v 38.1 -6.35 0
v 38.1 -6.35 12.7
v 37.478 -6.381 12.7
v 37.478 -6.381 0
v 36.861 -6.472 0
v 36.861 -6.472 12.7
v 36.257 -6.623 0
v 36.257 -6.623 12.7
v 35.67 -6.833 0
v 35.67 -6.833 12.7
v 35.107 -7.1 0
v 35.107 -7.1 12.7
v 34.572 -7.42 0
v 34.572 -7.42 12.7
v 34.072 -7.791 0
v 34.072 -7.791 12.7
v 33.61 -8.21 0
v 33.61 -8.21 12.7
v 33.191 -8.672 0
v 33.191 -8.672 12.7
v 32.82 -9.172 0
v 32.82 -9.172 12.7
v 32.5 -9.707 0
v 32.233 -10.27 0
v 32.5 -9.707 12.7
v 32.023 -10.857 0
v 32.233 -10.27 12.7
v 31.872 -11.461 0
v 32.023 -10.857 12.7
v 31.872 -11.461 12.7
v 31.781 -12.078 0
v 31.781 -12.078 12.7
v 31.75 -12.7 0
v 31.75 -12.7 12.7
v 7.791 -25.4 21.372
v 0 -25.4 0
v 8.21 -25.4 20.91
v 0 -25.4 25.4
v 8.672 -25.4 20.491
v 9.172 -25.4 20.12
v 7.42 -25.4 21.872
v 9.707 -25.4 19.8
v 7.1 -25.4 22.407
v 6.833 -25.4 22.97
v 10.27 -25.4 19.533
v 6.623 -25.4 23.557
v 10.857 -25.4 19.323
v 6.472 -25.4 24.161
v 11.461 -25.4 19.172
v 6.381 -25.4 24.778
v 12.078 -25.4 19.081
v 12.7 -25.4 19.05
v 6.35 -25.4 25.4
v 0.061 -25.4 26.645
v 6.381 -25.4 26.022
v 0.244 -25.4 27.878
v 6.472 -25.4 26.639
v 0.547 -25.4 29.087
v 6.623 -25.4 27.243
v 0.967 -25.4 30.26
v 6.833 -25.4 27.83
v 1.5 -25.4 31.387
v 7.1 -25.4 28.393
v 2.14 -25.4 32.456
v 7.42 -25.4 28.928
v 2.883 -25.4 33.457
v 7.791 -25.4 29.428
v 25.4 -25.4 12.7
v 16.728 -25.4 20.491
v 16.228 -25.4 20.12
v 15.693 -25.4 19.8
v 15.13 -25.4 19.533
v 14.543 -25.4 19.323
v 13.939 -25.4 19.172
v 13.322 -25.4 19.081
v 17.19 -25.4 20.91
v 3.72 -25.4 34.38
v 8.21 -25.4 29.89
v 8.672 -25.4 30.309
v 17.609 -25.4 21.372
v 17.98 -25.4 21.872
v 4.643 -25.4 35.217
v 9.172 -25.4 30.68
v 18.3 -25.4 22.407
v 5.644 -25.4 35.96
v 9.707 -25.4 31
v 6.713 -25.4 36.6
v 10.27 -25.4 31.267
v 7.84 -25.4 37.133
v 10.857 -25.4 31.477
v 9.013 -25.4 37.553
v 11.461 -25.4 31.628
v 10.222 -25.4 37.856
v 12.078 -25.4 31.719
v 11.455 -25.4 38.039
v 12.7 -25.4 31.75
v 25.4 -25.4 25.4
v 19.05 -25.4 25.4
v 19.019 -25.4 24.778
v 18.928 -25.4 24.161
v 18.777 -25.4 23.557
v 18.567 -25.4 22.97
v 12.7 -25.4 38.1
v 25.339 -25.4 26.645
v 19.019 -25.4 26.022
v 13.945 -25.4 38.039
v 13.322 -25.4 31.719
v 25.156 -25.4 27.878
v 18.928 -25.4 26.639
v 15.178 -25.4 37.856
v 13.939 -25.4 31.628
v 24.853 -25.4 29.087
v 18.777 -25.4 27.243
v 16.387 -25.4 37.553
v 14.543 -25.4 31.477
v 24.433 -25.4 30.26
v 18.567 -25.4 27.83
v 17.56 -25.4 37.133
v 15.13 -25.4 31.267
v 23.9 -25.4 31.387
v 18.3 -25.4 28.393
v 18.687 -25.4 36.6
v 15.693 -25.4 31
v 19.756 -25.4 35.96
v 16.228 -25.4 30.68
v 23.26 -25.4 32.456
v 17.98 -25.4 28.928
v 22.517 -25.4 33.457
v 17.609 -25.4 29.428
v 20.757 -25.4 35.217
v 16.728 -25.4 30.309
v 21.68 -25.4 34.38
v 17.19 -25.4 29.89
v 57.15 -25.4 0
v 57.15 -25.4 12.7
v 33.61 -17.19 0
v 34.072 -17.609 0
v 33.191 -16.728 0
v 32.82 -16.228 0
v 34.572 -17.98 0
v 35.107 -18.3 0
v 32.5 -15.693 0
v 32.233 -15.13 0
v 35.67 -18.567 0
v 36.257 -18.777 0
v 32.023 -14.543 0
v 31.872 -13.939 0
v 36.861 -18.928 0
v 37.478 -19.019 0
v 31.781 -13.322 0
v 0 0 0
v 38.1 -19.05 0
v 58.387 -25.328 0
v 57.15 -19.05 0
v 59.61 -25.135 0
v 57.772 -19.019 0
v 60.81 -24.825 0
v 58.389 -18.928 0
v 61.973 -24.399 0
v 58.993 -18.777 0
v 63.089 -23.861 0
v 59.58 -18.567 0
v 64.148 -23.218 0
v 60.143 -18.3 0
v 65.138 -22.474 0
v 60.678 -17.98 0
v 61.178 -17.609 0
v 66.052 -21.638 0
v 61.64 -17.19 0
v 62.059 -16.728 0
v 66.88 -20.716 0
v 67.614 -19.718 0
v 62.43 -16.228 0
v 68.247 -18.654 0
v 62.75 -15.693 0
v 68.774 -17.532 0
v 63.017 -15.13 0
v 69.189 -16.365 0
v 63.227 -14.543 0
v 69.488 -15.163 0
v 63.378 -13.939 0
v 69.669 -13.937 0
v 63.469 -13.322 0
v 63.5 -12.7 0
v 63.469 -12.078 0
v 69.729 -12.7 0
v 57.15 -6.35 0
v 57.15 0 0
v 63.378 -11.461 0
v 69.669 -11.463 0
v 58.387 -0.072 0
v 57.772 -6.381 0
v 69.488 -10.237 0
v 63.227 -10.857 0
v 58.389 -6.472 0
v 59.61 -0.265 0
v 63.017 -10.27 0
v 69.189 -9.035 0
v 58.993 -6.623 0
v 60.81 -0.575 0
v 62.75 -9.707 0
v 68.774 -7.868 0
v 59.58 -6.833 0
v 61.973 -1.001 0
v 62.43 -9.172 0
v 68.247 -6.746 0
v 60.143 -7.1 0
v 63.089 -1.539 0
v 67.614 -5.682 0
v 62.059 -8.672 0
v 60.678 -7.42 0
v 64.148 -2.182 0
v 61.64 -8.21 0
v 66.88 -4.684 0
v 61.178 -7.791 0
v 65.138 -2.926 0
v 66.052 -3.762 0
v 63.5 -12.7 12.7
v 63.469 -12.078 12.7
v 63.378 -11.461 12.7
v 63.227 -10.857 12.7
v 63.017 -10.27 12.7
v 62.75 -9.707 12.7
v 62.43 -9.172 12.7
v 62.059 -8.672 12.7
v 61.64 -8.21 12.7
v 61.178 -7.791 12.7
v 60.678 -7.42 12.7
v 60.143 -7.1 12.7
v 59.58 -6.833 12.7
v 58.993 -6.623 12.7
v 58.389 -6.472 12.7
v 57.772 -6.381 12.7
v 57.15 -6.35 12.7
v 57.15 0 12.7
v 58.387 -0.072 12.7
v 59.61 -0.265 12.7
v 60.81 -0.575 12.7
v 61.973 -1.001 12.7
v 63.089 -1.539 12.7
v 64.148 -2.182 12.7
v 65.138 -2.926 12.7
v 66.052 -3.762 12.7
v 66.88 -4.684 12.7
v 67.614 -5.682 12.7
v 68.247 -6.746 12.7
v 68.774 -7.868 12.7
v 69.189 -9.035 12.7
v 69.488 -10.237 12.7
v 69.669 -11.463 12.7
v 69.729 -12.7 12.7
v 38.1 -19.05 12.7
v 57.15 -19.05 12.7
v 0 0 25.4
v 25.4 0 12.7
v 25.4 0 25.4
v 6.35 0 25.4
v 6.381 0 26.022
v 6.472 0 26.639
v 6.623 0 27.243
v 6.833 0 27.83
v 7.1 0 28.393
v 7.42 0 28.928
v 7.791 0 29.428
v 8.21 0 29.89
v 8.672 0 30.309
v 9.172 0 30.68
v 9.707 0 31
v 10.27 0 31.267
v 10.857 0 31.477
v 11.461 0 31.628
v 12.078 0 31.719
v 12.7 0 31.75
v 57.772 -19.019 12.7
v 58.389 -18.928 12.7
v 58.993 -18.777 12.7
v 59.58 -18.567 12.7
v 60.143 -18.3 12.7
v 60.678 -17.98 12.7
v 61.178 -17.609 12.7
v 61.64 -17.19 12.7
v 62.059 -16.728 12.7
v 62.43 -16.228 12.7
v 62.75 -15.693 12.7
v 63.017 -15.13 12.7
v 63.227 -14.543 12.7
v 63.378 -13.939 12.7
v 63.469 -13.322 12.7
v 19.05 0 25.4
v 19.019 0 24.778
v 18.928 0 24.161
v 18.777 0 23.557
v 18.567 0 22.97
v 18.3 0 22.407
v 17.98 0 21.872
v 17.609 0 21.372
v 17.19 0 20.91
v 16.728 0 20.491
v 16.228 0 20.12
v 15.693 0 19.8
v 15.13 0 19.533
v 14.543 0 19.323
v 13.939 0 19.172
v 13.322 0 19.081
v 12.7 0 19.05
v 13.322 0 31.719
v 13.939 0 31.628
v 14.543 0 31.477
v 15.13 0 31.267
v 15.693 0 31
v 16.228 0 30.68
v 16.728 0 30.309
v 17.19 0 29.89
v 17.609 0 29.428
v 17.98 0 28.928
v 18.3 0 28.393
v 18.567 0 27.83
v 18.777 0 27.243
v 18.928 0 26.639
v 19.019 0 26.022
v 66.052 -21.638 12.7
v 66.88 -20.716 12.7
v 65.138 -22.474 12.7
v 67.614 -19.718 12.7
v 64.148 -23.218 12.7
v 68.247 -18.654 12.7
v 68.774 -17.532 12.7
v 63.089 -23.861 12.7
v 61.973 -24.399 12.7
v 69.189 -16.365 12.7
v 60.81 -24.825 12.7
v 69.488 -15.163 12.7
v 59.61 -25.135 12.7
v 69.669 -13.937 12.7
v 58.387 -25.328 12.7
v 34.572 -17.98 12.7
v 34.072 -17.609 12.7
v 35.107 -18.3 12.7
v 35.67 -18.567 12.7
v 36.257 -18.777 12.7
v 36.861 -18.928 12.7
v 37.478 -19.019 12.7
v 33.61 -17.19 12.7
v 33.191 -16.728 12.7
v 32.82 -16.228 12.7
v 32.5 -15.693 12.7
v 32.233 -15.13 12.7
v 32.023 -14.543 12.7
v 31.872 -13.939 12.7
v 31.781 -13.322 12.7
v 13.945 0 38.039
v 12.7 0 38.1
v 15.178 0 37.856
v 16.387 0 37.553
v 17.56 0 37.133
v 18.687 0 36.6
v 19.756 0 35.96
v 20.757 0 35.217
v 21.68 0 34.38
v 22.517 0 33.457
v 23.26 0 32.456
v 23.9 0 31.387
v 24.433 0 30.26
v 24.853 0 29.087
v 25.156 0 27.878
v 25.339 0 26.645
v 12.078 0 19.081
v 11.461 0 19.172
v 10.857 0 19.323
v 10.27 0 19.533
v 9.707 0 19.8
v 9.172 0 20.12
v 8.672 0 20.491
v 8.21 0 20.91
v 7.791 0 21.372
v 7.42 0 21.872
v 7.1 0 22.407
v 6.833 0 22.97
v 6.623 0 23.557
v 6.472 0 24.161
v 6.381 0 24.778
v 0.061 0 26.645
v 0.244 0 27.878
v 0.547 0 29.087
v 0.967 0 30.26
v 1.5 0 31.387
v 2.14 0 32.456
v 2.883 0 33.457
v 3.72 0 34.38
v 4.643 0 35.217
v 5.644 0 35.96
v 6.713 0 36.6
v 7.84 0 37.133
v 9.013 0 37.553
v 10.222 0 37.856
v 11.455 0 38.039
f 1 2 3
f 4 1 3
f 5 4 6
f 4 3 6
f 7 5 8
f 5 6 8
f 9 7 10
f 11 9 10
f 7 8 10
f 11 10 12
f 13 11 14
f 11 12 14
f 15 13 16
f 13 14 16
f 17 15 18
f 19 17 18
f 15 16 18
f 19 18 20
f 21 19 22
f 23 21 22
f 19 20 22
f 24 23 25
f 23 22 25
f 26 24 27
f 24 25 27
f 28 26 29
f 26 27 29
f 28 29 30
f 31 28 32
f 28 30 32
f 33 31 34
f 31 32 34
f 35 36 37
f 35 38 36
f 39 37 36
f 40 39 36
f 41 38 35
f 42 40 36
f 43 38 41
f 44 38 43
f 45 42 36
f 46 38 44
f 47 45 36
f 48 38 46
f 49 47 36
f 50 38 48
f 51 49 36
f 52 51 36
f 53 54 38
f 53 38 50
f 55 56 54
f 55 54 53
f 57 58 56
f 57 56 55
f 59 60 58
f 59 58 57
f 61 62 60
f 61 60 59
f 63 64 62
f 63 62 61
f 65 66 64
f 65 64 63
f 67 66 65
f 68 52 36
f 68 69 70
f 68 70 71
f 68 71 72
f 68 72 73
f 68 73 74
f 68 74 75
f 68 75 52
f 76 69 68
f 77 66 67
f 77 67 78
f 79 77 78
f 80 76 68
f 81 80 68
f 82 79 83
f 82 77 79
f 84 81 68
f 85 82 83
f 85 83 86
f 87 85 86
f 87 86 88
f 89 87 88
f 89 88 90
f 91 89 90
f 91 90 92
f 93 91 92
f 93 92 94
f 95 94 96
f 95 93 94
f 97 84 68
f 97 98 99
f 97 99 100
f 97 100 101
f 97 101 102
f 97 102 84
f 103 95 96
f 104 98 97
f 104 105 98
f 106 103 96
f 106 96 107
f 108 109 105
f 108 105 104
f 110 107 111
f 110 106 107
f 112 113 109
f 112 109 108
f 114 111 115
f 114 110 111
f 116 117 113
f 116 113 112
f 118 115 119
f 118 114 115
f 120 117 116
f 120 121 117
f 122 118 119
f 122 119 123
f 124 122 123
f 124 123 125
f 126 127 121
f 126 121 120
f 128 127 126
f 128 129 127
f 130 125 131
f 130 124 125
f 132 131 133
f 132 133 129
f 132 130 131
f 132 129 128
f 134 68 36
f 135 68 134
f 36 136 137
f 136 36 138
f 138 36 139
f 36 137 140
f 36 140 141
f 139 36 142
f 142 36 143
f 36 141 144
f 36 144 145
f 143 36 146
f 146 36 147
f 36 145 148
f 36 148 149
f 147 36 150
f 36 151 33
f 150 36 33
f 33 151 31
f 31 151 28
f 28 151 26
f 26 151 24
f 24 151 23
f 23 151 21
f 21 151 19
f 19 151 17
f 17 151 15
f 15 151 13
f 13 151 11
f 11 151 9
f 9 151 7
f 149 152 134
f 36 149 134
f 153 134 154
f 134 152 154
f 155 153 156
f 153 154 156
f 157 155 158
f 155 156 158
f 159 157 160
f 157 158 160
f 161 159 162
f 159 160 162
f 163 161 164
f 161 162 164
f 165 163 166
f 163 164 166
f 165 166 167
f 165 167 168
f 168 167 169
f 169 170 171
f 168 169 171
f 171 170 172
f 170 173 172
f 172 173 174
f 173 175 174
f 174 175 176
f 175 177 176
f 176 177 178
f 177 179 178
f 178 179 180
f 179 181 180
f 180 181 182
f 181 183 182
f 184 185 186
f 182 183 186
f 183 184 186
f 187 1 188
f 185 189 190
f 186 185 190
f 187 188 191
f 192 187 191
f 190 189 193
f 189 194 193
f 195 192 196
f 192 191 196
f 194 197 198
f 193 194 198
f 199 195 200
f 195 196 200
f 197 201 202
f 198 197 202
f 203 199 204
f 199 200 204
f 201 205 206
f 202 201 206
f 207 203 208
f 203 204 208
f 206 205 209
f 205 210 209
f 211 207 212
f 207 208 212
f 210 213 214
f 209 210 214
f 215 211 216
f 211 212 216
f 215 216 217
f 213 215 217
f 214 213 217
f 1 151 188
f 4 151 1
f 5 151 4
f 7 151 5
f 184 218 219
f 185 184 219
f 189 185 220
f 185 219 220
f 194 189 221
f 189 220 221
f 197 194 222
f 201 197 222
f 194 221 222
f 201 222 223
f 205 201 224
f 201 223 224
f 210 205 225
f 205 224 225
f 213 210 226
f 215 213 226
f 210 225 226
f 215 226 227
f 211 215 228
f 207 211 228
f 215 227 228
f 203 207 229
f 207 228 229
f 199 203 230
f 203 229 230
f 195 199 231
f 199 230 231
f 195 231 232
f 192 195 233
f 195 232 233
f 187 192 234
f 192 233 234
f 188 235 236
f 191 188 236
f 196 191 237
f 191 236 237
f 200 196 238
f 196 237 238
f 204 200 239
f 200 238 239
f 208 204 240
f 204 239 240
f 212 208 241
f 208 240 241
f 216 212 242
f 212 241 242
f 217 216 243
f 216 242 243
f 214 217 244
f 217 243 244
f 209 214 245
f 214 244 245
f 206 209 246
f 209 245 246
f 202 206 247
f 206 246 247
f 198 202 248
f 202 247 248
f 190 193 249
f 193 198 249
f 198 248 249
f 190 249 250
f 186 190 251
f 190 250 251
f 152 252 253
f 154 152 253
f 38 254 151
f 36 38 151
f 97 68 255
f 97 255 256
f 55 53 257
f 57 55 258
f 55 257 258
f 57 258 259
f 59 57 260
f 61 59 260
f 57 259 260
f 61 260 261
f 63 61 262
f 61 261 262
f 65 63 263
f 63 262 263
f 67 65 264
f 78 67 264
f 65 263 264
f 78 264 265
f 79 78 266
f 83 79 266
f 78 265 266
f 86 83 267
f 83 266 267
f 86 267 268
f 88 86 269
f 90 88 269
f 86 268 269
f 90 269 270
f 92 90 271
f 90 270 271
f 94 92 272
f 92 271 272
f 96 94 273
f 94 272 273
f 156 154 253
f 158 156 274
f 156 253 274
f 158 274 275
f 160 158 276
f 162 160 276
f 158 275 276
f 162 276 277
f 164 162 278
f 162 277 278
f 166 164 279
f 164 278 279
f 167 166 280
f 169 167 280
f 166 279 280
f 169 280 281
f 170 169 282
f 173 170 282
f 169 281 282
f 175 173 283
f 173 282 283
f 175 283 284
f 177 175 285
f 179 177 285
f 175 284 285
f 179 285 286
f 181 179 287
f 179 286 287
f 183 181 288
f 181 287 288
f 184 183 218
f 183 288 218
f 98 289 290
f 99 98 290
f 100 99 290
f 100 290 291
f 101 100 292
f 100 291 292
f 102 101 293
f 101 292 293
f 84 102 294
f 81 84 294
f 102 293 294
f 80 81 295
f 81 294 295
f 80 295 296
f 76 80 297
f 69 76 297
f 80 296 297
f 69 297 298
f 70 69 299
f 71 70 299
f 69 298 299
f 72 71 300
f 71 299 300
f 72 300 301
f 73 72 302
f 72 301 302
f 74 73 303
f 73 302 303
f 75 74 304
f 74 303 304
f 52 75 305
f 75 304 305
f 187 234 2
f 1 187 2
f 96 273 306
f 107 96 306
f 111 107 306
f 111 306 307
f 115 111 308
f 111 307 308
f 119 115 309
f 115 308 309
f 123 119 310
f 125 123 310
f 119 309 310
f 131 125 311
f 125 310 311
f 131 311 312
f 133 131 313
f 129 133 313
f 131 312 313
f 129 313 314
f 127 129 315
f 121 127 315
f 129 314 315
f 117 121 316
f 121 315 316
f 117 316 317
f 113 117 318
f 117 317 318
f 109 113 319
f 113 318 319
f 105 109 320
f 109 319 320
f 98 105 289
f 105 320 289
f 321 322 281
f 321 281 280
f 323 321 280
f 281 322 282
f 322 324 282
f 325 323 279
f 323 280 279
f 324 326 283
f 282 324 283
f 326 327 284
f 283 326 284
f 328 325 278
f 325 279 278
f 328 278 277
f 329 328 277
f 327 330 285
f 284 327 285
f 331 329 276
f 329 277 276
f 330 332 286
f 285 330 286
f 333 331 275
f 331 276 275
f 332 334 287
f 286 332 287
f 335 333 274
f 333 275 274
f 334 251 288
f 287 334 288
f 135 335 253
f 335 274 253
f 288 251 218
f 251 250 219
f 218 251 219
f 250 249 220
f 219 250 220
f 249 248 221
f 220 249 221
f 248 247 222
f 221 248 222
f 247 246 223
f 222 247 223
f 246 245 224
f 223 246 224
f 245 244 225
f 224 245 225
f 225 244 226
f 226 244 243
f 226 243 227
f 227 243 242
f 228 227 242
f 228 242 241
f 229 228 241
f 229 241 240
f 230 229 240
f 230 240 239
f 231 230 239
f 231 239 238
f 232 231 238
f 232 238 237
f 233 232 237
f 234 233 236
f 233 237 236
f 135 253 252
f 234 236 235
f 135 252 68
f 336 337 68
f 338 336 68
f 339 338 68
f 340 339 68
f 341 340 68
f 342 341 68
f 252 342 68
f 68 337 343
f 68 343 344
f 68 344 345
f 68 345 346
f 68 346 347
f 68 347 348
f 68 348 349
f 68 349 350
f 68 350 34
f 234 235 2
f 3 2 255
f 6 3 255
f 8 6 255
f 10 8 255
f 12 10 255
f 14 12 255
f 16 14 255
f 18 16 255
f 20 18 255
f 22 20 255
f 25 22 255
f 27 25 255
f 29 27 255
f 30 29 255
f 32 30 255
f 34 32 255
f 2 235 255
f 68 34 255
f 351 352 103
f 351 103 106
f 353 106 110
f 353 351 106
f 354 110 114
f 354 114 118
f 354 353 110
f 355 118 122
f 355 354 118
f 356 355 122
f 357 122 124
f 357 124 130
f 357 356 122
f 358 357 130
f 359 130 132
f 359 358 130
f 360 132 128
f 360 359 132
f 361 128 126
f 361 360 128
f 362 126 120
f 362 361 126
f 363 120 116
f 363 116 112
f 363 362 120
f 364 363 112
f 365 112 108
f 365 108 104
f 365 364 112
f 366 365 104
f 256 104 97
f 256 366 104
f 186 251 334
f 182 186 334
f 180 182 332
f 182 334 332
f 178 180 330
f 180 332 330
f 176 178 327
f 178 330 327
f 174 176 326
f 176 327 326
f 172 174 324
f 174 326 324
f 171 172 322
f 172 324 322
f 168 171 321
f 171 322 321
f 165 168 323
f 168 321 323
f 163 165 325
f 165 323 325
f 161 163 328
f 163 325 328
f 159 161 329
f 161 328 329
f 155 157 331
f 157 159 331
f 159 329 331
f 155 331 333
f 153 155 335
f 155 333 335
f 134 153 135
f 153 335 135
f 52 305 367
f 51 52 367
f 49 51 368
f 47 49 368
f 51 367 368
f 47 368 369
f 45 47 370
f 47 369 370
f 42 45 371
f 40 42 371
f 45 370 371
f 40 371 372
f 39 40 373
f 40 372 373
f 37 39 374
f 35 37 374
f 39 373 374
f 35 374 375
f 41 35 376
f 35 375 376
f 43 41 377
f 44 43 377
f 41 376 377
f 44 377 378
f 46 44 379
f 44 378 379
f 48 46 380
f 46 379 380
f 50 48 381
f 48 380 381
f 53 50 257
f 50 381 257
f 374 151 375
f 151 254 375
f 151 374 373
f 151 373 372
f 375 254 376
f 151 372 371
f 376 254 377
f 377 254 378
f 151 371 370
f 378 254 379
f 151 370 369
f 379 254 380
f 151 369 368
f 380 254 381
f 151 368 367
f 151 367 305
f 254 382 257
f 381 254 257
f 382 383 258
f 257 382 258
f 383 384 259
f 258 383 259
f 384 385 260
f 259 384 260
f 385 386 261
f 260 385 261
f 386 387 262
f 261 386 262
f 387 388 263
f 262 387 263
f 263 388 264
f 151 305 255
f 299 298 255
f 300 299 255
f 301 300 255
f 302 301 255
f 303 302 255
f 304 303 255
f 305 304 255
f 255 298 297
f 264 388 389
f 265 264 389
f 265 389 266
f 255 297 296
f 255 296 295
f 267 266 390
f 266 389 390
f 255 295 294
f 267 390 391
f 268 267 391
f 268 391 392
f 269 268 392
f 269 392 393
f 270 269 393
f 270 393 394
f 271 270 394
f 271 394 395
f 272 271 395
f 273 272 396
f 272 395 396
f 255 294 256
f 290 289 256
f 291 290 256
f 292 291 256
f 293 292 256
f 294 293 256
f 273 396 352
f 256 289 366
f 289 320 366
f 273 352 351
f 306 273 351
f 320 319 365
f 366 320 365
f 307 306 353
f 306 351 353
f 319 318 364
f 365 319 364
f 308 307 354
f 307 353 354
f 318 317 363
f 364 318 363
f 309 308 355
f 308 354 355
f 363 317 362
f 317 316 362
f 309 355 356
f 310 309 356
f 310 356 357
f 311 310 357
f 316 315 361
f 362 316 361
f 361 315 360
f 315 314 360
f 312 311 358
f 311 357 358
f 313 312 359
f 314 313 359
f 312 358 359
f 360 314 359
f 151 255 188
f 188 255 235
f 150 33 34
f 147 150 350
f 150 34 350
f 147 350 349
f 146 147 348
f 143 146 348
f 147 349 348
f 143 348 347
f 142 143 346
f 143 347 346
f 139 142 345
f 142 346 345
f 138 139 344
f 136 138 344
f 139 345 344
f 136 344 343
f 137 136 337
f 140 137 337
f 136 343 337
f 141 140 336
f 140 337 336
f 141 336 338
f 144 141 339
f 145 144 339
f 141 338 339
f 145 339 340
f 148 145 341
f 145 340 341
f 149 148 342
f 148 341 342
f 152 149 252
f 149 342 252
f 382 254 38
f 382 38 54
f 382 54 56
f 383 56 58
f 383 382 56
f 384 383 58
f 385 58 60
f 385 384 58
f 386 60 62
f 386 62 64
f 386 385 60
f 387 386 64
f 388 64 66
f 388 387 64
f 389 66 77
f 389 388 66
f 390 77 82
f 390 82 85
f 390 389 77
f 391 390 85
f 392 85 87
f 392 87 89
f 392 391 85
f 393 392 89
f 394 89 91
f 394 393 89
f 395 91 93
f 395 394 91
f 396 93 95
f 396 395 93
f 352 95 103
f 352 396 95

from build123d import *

# Parameters (mm, degrees)
F1_DEPTH = 25.4
F2_DEPTH = 25.4
F4_DEPTH = 25.4


with BuildPart() as f1:
    # F0 (on Front) → F1 (new body)
    with BuildSketch(Plane.XZ):
        with BuildLine():
            Line((0, 25.4), (0, 0))
            Line((0, 0), (12.7, 0))
            Line((12.7, 0), (12.7, 12.7))
            ThreePointArc((12.7, 12.7), (3.7197438789, 16.4197438789), (0, 25.4))
        make_face()
        with BuildLine():
            ThreePointArc((12.7, 38.1), (3.7197438789, 34.3802561211), (0, 25.4))
            Line((0, 25.4), (6.35, 25.4))
            ThreePointArc((6.35, 25.4), (8.2098719395, 29.8901280605), (12.7, 31.75))
            Line((12.7, 31.75), (12.7, 38.1))
        make_face()
        with BuildLine():
            Line((0, 38.1), (0, 25.4))
            ThreePointArc((0, 25.4), (3.7197438789, 34.3802561211), (12.7, 38.1))
            Line((12.7, 38.1), (0, 38.1))
        make_face()
        with BuildLine():
            Line((6.35, 25.4), (0, 25.4))
            ThreePointArc((0, 25.4), (3.7197438789, 16.4197438789), (12.7, 12.7))
            Line((12.7, 12.7), (12.7, 19.05))
            ThreePointArc((12.7, 19.05), (8.2098719395, 20.9098719395), (6.35, 25.4))
        make_face()
        with BuildLine():
            Line((12.7, 12.7), (12.7, 0))
            Line((12.7, 0), (69.85, 0))
            Line((69.85, 0), (69.85, 12.7))
            Line((69.85, 12.7), (25.4, 12.7))
            Line((25.4, 12.7), (25.4, 25.4))
            ThreePointArc((25.4, 25.4), (21.6802561211, 16.4197438789), (12.7, 12.7))
        make_face()
        with BuildLine():
            ThreePointArc((25.4, 25.4), (21.6802561211, 34.3802561211), (12.7, 38.1))
            Line((12.7, 38.1), (12.7, 31.75))
            ThreePointArc((12.7, 31.75), (17.1901280605, 29.8901280605), (19.05, 25.4))
            Line((19.05, 25.4), (25.4, 25.4))
        make_face()
        with BuildLine():
            Line((25.4, 38.1), (12.7, 38.1))
            ThreePointArc((12.7, 38.1), (21.6802561211, 34.3802561211), (25.4, 25.4))
            Line((25.4, 25.4), (25.4, 38.1))
        make_face()
        with BuildLine():
            Line((12.7, 19.05), (12.7, 12.7))
            ThreePointArc((12.7, 12.7), (21.6802561211, 16.4197438789), (25.4, 25.4))
            Line((25.4, 25.4), (19.05, 25.4))
            ThreePointArc((19.05, 25.4), (17.1901280605, 20.9098719395), (12.7, 19.05))
        make_face()
    extrude(amount=F1_DEPTH)

    # F0 (on Front) → F2 (cut)
    with BuildSketch(Plane.XZ):
        with BuildLine():
            Line((0, 38.1), (0, 25.4))
            ThreePointArc((0, 25.4), (3.7197438789, 34.3802561211), (12.7, 38.1))
            Line((12.7, 38.1), (0, 38.1))
        make_face()
        with BuildLine():
            Line((25.4, 38.1), (12.7, 38.1))
            ThreePointArc((12.7, 38.1), (21.6802561211, 34.3802561211), (25.4, 25.4))
            Line((25.4, 25.4), (25.4, 38.1))
        make_face()
    extrude(amount=F2_DEPTH, mode=Mode.SUBTRACT)

    # F3 (on face) → F4 (cut)
    with BuildSketch(Plane.XY.offset(12.7)):
        with BuildLine():
            ThreePointArc((44.45, -12.7), (42.5901280605, -8.2098719395), (38.1, -6.35))
            Line((38.1, -6.35), (38.1, -12.7))
            Line((38.1, -12.7), (44.45, -12.7))
        make_face()
        with BuildLine():
            Line((38.1, -12.7), (38.1, -6.35))
            ThreePointArc((38.1, -6.35), (33.6098719395, -8.2098719395), (31.75, -12.7))
            Line((31.75, -12.7), (38.1, -12.7))
        make_face()
        with BuildLine():
            Line((44.45, -12.7), (38.1, -12.7))
            Line((38.1, -12.7), (38.1, -19.05))
            ThreePointArc((38.1, -19.05), (42.5901280605, -17.1901280605), (44.45, -12.7))
        make_face()
        with BuildLine():
            Line((38.1, -19.05), (38.1, -12.7))
            Line((38.1, -12.7), (31.75, -12.7))
            ThreePointArc((31.75, -12.7), (33.6098719395, -17.1901280605), (38.1, -19.05))
        make_face()
        with BuildLine():
            ThreePointArc((63.5, -12.7), (61.6401280605, -8.2098719395), (57.15, -6.35))
            Line((57.15, -6.35), (57.15, -12.7))
            Line((57.15, -12.7), (63.5, -12.7))
        make_face()
        with BuildLine():
            Line((57.15, -12.7), (57.15, -6.35))
            ThreePointArc((57.15, -6.35), (52.6598719395, -8.2098719395), (50.8, -12.7))
            Line((50.8, -12.7), (57.15, -12.7))
        make_face()
        with BuildLine():
            Line((63.5, -12.7), (57.15, -12.7))
            Line((57.15, -12.7), (57.15, -19.05))
            ThreePointArc((57.15, -19.05), (61.6401280605, -17.1901280605), (63.5, -12.7))
        make_face()
        with BuildLine():
            Line((57.15, -12.7), (50.8, -12.7))
            ThreePointArc((50.8, -12.7), (52.6598719395, -17.1901280605), (57.15, -19.05))
            Line((57.15, -19.05), (57.15, -12.7))
        make_face()
        with BuildLine():
            Line((57.15, -6.35), (38.1, -6.35))
            ThreePointArc((38.1, -6.35), (42.5901280605, -8.2098719395), (44.45, -12.7))
            Line((44.45, -12.7), (50.8, -12.7))
            ThreePointArc((50.8, -12.7), (52.6598719395, -8.2098719395), (57.15, -6.35))
        make_face()
        with BuildLine():
            Line((50.8, -12.7), (44.45, -12.7))
            ThreePointArc((44.45, -12.7), (42.5901280605, -17.1901280605), (38.1, -19.05))
            Line((38.1, -19.05), (57.15, -19.05))
            ThreePointArc((57.15, -19.05), (52.6598719395, -17.1901280605), (50.8, -12.7))
        make_face()
        with BuildLine():
            Line((69.85, -12.7), (69.7292175596, -12.7))
            ThreePointArc((69.7292175596, -12.7), (66.0521098797, -21.6376550953), (57.15, -25.4))
            Line((57.15, -25.4), (69.85, -25.4))
            Line((69.85, -25.4), (69.85, -12.7))
        make_face()
        with BuildLine():
            Line((69.85, 0), (57.15, 0))
            ThreePointArc((57.15, 0), (66.0521098797, -3.7623449047), (69.7292175596, -12.7))
            Line((69.7292175596, -12.7), (69.85, -12.7))
            Line((69.85, -12.7), (69.85, 0))
        make_face()
    extrude(amount=-F4_DEPTH, mode=Mode.SUBTRACT)


solid = f1.part
